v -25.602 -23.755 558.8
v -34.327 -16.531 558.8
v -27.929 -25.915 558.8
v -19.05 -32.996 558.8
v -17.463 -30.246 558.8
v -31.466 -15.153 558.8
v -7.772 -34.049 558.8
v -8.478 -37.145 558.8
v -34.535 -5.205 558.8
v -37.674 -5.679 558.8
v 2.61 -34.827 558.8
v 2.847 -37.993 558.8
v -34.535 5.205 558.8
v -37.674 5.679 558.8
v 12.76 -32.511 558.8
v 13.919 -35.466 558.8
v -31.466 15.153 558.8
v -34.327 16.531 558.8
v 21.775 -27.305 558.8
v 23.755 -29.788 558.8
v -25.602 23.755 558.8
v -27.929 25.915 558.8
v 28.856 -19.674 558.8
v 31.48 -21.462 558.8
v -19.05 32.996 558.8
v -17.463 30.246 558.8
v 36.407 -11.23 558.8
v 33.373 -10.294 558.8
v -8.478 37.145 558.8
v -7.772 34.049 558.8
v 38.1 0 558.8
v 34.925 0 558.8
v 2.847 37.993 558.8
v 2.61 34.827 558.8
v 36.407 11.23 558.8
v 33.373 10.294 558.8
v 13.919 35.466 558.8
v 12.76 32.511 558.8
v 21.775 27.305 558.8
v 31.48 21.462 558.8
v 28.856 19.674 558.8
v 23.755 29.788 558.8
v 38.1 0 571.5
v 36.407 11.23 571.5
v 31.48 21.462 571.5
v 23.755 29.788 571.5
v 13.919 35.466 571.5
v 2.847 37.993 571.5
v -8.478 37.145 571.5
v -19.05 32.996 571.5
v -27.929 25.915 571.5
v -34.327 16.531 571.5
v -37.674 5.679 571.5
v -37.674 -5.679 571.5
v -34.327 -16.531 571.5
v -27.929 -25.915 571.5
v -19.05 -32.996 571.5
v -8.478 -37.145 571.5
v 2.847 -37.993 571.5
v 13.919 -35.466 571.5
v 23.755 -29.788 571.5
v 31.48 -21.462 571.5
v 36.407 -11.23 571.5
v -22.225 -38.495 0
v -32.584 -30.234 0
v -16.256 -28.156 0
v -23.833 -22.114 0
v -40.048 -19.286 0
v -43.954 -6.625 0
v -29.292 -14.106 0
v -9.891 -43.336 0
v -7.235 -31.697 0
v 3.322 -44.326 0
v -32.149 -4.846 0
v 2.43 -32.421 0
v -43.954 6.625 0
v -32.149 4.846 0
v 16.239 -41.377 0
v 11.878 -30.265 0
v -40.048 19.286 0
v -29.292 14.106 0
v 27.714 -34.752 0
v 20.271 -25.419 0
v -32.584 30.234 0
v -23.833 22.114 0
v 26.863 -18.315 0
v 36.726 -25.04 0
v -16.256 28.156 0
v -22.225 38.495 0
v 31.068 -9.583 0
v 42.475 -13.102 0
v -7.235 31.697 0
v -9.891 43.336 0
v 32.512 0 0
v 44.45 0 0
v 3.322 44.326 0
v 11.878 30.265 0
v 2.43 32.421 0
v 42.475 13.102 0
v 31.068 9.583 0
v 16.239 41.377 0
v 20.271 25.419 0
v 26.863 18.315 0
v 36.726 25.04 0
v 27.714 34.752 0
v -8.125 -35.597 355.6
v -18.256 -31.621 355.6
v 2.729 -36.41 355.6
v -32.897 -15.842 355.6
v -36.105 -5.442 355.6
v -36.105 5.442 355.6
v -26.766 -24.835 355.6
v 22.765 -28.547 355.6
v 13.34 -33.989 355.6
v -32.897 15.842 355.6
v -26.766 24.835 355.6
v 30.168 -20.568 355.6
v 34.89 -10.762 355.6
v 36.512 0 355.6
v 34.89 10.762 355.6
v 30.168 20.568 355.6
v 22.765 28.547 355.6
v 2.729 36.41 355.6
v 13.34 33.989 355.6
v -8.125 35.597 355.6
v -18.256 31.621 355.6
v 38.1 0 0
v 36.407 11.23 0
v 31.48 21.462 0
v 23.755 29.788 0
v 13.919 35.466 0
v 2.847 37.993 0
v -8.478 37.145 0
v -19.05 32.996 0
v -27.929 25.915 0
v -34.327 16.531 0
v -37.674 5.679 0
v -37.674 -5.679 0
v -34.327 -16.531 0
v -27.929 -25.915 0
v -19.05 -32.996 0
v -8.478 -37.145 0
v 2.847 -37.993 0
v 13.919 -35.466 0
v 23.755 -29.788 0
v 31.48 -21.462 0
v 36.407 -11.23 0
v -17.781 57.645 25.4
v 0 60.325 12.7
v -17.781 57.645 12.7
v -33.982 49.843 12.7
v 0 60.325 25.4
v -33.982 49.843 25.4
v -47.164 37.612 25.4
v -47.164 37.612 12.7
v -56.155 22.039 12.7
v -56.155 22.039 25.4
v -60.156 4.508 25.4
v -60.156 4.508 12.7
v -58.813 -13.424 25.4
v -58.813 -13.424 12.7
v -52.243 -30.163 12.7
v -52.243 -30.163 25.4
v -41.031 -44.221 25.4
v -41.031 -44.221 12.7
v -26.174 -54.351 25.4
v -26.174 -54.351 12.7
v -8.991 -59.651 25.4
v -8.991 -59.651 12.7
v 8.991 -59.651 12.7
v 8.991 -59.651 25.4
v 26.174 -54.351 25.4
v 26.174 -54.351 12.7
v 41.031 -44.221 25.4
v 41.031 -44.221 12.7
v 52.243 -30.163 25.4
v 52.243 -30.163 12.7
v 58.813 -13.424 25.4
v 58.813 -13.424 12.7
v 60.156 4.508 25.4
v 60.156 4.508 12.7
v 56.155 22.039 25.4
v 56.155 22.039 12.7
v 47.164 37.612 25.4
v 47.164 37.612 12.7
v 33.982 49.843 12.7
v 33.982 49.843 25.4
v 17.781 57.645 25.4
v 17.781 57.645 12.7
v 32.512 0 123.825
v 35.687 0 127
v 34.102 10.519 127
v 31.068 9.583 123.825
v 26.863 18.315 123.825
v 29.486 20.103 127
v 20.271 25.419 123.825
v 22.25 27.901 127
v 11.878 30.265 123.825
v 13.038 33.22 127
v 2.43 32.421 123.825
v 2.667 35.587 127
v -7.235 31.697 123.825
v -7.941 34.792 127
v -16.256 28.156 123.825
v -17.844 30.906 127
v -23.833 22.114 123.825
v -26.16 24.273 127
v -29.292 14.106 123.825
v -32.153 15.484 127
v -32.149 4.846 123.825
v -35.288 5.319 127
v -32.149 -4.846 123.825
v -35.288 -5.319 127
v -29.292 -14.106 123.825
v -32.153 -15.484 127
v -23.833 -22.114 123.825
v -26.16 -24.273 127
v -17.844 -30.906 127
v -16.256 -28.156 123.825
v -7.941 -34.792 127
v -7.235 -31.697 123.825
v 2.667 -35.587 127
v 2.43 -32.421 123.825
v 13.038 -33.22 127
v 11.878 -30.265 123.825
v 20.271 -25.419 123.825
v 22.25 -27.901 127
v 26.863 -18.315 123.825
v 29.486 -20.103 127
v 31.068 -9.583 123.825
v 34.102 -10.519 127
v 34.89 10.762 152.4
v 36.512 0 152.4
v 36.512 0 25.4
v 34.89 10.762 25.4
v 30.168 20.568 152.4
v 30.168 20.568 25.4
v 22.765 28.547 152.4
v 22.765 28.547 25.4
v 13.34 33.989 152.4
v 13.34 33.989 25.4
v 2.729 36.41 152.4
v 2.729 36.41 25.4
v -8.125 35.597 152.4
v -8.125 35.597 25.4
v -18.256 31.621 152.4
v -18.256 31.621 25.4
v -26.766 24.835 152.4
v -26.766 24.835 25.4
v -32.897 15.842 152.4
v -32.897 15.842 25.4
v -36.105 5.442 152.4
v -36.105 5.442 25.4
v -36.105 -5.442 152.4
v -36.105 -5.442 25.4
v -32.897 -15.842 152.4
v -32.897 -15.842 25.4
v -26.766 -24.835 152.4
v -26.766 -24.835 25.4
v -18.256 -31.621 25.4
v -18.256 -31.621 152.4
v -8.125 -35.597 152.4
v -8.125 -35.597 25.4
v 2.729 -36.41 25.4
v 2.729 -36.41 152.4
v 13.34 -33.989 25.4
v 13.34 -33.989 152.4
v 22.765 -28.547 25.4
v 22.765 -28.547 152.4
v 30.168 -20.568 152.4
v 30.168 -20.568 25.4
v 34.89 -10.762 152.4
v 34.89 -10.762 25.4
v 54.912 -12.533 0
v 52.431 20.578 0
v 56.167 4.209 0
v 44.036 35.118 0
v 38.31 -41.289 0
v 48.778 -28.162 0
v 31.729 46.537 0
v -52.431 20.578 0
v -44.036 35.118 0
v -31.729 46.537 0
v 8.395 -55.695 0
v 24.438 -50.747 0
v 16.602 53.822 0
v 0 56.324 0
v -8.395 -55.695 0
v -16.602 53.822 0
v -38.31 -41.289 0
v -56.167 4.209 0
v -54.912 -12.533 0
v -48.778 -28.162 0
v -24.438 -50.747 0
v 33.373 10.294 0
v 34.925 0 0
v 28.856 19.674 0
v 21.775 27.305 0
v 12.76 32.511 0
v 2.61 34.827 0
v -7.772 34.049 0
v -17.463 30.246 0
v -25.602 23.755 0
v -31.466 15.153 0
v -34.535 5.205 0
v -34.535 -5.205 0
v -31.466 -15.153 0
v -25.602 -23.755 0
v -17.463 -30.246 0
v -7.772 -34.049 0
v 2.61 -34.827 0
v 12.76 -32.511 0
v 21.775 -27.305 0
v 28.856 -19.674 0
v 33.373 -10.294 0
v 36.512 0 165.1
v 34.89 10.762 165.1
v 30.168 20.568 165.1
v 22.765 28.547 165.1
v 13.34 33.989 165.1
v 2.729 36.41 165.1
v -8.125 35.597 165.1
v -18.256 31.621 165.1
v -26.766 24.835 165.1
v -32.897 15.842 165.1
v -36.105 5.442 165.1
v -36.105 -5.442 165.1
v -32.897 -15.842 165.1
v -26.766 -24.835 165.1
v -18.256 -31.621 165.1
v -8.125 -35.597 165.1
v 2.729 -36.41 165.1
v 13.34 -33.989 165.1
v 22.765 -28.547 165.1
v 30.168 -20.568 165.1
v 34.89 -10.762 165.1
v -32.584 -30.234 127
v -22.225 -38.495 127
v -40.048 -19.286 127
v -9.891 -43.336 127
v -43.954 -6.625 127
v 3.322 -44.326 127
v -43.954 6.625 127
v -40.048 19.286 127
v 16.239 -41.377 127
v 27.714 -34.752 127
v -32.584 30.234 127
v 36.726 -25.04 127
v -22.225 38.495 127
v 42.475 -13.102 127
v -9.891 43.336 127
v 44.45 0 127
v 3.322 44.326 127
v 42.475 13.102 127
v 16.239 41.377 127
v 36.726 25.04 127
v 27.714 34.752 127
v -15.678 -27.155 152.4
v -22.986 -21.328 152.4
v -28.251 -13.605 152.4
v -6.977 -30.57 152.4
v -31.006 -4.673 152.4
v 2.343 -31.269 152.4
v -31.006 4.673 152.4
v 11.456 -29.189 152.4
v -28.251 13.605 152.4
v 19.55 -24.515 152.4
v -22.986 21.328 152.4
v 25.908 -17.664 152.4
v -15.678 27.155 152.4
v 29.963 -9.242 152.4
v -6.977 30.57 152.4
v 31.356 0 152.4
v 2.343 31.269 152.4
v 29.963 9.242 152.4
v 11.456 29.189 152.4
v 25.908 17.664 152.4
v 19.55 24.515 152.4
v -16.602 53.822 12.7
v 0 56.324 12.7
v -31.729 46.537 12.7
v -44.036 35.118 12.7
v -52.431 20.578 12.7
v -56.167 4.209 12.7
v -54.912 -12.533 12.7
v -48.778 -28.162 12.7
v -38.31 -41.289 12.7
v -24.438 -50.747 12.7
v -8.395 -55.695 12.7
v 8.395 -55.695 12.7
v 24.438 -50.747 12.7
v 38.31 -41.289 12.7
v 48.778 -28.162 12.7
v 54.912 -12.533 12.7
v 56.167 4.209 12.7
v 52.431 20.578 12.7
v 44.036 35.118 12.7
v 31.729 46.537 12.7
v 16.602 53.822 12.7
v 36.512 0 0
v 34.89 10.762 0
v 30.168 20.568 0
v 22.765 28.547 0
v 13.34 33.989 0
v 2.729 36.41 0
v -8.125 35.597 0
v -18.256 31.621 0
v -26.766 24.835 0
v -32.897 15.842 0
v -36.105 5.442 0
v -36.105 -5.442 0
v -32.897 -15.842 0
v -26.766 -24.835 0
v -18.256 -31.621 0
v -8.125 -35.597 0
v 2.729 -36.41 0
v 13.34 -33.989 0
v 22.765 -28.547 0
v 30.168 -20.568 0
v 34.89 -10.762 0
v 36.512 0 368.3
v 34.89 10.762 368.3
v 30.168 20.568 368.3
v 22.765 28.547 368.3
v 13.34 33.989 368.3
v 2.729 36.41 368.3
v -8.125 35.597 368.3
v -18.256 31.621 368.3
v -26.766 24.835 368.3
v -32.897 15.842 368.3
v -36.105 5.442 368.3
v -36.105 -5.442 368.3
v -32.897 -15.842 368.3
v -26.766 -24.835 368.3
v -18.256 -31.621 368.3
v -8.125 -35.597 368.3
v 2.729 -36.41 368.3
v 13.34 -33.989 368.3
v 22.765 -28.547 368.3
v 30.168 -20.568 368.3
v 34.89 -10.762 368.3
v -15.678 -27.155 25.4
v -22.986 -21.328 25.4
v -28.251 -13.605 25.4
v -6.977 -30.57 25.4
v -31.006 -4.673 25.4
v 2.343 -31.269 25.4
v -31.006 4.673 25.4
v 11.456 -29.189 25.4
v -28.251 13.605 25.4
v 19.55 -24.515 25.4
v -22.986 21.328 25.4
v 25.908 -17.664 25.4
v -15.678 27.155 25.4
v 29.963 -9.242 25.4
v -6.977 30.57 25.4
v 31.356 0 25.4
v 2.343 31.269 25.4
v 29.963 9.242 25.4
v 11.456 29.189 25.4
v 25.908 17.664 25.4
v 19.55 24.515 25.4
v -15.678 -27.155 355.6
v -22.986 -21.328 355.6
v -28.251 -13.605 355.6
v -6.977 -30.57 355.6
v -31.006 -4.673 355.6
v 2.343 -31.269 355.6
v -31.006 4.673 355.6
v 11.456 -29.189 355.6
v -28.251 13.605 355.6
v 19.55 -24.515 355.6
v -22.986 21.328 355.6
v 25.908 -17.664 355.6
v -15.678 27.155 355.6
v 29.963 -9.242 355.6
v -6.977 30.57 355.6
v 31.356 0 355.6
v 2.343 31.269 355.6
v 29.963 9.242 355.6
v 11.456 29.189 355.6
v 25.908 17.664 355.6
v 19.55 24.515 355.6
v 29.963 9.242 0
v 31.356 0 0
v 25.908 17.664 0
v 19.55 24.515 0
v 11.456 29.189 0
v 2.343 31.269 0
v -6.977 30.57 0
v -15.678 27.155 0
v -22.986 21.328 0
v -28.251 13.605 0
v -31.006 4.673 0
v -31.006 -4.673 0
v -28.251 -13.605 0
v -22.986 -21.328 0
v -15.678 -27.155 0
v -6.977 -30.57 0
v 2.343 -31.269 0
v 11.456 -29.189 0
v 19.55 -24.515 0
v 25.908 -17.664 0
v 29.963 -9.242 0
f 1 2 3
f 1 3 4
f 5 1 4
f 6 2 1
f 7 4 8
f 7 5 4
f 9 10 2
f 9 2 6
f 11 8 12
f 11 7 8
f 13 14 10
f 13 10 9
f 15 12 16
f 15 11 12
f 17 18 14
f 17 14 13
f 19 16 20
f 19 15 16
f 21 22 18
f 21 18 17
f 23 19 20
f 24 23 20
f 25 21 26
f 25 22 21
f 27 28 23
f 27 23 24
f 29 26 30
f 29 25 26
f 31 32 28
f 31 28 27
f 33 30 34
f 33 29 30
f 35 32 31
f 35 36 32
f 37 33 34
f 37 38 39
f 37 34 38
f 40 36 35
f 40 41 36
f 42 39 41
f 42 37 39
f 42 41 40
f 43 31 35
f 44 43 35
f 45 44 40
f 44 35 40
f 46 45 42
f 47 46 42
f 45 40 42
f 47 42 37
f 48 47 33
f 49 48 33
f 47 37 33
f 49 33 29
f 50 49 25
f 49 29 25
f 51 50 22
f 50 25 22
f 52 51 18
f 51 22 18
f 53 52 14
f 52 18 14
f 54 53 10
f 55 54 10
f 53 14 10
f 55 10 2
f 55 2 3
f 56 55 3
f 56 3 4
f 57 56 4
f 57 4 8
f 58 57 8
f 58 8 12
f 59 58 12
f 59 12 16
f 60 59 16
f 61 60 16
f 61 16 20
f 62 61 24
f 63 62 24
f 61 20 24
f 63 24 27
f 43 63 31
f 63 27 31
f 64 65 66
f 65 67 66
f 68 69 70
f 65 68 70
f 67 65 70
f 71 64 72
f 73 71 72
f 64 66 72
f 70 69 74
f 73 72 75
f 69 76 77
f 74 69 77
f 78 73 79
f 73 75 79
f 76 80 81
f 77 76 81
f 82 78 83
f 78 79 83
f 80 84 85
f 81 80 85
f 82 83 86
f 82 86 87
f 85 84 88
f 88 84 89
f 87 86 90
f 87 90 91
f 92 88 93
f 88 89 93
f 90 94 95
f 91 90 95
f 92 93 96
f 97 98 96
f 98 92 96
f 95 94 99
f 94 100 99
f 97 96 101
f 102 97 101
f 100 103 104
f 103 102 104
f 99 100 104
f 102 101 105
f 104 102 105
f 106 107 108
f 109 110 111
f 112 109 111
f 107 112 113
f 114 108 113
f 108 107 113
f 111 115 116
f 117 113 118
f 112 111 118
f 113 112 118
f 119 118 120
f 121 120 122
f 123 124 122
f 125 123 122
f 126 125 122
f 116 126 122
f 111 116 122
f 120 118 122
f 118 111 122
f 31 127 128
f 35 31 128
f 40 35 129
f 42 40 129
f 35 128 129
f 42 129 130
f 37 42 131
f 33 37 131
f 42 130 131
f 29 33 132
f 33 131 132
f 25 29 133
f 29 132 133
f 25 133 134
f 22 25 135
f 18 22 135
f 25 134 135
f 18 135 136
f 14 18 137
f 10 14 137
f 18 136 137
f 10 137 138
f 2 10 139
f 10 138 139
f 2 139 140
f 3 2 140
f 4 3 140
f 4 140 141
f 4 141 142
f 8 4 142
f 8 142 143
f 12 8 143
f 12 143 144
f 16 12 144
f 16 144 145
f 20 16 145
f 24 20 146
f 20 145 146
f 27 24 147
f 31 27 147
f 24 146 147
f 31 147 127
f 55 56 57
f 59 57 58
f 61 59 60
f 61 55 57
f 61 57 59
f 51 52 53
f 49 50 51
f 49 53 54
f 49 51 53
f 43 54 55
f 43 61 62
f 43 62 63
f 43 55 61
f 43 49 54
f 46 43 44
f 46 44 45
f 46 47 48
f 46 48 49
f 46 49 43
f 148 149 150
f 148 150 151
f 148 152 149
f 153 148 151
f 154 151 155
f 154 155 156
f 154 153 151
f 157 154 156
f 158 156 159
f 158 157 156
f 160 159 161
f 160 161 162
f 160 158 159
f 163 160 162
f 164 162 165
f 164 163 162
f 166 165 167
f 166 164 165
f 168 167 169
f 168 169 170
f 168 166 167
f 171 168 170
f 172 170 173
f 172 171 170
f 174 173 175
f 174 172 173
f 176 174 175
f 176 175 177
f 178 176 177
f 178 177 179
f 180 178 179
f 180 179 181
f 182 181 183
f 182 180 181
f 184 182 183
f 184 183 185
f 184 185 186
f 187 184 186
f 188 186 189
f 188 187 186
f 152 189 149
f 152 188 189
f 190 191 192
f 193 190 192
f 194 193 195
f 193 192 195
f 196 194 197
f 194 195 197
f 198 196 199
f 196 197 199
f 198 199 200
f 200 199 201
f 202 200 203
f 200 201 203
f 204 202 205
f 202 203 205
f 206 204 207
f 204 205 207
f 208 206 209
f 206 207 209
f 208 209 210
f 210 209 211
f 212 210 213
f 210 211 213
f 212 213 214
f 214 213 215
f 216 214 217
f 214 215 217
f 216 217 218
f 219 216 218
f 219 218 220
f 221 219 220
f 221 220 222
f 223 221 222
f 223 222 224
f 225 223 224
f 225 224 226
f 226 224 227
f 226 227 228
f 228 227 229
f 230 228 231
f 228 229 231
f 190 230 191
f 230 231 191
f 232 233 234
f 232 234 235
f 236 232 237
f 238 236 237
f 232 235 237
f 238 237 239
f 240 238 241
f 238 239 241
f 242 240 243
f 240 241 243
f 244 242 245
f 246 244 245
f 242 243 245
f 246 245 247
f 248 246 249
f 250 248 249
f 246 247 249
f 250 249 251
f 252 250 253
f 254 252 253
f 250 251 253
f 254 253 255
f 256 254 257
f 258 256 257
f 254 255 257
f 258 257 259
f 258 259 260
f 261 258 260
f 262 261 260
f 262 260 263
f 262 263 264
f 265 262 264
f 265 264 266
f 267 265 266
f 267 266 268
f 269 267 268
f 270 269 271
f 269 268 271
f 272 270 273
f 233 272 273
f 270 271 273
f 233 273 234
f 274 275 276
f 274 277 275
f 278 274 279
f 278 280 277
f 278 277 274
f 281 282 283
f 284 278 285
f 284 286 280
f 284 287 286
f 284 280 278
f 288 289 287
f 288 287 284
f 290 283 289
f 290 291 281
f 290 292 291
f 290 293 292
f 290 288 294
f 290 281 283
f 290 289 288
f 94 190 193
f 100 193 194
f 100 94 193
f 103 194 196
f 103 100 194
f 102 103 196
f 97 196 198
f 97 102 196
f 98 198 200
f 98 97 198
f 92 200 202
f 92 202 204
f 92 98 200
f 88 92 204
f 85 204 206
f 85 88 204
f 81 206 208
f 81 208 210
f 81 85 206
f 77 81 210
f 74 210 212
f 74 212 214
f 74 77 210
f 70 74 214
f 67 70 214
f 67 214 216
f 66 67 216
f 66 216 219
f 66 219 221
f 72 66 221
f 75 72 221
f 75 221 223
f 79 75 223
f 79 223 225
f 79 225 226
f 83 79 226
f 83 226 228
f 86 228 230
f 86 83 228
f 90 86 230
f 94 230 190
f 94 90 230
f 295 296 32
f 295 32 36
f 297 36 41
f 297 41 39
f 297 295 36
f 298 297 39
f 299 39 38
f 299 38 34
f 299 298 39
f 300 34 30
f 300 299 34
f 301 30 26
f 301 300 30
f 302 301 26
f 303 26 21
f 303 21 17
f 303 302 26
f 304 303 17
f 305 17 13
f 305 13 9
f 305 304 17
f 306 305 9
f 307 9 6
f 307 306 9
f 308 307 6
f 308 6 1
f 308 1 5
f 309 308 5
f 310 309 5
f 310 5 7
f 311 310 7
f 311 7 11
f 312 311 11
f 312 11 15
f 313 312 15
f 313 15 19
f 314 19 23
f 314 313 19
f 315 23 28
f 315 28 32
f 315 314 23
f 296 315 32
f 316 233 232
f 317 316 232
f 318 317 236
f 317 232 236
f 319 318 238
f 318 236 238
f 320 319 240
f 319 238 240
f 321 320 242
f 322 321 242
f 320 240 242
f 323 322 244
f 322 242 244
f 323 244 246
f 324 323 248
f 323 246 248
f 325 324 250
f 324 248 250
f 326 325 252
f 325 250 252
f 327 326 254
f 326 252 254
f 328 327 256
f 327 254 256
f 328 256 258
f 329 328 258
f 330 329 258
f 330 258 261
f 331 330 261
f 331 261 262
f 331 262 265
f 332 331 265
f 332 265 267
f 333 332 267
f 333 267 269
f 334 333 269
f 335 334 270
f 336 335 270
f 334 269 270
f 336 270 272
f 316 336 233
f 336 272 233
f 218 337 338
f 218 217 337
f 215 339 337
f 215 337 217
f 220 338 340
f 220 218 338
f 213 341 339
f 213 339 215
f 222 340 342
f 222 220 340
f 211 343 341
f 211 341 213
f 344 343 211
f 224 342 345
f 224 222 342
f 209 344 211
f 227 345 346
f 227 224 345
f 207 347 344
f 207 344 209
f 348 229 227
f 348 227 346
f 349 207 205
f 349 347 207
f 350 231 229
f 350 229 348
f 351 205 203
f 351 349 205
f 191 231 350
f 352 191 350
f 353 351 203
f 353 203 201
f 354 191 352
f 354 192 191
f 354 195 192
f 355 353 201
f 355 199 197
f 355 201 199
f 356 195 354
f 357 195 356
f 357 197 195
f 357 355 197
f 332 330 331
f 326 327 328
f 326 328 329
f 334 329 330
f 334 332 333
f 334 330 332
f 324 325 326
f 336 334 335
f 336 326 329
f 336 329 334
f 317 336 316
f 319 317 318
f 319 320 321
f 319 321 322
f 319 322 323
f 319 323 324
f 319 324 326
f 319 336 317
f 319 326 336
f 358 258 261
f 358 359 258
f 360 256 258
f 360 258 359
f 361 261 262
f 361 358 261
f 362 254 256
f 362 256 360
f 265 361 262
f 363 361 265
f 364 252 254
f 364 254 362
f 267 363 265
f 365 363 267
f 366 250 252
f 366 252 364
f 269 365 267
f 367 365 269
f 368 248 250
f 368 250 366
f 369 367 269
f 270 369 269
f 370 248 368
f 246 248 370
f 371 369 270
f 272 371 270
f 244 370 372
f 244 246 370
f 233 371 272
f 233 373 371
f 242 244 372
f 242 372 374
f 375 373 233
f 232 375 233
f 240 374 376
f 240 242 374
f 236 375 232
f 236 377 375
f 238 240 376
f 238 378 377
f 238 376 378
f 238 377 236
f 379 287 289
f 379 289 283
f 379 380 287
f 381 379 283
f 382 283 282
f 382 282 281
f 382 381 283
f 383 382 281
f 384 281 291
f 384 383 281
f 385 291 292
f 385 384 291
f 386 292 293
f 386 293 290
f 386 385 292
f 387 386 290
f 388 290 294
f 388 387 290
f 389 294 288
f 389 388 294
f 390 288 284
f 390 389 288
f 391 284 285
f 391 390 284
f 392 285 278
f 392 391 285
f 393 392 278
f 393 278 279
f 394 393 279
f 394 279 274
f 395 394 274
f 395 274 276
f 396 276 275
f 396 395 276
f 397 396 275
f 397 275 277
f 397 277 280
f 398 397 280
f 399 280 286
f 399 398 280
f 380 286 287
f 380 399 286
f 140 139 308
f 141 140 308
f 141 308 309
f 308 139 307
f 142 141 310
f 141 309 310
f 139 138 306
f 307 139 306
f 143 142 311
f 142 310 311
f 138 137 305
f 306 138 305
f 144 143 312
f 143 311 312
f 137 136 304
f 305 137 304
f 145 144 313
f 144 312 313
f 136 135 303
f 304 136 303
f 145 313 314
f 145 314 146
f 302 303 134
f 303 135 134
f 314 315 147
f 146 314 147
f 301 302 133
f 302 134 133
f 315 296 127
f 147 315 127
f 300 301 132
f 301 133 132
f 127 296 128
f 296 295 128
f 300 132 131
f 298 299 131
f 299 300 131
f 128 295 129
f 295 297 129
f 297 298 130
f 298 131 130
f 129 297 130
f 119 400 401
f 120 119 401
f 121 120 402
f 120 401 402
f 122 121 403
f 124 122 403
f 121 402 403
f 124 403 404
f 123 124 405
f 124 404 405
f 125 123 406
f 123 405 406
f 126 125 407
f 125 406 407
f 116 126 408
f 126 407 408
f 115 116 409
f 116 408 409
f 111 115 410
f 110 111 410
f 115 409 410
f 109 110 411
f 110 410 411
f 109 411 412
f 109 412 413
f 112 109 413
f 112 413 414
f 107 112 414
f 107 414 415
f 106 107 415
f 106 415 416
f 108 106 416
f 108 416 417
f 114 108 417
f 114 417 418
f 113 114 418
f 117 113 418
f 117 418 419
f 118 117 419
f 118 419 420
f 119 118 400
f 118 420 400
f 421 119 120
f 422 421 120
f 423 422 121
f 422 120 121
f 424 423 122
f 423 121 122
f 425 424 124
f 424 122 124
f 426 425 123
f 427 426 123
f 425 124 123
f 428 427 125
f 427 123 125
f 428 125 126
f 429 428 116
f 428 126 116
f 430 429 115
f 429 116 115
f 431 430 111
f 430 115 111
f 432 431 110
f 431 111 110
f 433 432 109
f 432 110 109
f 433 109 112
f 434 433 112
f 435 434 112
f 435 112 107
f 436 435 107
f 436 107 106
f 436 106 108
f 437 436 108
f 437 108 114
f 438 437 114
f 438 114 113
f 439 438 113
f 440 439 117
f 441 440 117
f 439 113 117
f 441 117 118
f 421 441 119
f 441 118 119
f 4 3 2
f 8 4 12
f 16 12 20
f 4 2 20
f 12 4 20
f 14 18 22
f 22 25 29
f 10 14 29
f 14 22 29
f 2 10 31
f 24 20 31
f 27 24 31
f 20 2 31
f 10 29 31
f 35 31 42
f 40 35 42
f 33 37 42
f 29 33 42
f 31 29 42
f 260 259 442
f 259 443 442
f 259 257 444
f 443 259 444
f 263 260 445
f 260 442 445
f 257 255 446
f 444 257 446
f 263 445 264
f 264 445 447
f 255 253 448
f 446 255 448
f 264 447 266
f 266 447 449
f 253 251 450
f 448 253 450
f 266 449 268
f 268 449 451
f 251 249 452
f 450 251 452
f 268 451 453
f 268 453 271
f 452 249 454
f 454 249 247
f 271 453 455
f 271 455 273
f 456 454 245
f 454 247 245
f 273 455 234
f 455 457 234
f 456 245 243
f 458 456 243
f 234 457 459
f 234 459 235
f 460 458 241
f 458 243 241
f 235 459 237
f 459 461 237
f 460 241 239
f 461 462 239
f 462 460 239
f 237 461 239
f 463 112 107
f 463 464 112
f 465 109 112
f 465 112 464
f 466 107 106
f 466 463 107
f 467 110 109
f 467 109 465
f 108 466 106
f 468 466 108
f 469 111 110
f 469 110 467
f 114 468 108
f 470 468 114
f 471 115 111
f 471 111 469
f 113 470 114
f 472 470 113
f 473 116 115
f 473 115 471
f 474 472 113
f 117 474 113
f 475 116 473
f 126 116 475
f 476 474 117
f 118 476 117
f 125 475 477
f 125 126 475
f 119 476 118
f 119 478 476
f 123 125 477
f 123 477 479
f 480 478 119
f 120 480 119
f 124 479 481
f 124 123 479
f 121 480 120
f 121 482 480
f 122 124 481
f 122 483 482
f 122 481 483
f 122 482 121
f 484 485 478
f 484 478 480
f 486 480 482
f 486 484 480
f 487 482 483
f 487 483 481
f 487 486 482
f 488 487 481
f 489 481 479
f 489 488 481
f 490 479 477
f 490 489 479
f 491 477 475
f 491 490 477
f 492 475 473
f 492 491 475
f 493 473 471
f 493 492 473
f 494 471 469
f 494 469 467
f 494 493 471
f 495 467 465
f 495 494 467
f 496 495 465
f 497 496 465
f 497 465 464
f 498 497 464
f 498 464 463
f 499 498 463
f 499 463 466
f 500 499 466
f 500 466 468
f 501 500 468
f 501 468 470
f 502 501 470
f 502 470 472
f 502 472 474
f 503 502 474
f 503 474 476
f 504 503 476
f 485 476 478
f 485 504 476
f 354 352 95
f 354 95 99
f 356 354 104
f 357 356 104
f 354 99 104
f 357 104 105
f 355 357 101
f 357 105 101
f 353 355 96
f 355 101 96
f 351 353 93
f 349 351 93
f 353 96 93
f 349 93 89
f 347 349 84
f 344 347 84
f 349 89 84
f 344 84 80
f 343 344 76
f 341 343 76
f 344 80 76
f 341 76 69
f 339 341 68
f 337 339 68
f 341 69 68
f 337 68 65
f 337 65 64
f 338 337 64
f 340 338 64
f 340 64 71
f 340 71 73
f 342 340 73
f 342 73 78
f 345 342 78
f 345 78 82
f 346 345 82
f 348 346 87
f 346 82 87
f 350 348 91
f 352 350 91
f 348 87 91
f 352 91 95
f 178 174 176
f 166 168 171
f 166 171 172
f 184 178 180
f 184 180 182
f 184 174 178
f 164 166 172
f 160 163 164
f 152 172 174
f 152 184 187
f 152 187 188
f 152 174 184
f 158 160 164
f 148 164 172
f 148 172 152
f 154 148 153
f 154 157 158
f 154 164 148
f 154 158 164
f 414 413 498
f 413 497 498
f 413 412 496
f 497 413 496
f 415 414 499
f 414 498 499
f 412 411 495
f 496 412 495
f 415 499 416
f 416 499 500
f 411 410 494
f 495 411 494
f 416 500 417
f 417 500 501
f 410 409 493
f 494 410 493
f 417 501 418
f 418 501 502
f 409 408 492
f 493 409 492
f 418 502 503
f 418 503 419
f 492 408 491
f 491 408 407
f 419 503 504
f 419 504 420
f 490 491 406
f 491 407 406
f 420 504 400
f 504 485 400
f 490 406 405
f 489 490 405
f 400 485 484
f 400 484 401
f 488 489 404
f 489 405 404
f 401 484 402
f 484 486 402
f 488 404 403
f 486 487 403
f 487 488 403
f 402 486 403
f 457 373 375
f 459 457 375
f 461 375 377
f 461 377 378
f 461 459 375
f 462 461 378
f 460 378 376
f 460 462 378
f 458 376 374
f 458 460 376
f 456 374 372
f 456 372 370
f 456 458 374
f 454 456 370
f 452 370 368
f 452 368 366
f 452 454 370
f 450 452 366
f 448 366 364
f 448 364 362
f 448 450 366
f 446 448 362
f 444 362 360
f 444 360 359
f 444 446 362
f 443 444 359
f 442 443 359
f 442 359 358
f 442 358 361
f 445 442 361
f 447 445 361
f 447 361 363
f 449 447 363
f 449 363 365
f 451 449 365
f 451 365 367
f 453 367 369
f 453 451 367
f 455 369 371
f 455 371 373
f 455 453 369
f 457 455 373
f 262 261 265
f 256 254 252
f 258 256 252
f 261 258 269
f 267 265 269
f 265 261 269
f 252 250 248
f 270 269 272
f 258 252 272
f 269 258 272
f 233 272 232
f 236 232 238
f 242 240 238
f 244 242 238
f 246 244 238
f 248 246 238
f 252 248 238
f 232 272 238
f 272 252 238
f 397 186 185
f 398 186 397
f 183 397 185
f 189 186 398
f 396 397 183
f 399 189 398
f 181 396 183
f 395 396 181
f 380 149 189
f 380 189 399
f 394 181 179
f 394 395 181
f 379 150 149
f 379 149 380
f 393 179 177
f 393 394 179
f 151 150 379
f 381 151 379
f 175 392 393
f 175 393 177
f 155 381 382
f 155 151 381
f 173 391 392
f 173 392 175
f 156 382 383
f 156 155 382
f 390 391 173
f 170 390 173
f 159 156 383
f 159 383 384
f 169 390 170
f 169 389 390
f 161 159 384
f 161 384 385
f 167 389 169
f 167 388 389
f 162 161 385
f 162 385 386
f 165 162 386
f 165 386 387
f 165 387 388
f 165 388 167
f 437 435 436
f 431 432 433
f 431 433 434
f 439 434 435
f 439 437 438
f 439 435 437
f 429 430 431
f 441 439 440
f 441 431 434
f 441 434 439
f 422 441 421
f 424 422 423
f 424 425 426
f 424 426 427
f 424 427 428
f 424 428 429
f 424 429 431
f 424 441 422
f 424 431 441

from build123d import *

# Parameters (mm, degrees)
F0_R      = 44.45
F0_R_2    = 32.512
F1_DEPTH  = 127
F2_SIZE   = 3.175
F3_R      = 36.5125
F3_R_2    = 31.3563
F4_DEPTH  = 355.6
F5_R      = 36.5125
F6_DEPTH  = 12.7
F7_R      = 38.1
F7_R_2    = 34.925
F8_DEPTH  = 558.8
F9_R      = 38.1
F10_DEPTH = 12.7
F13_R     = 36.5125
F13_R_2   = 31.3563
F14_DEPTH = 127
F15_R     = 36.5125
F16_DEPTH = 12.7


with BuildPart() as f1:
    # F0 (on Top) → F1 (new body)
    with BuildSketch(Plane.XY):
        Circle(F0_R)
        Circle(F0_R_2, mode=Mode.SUBTRACT)
    extrude(amount=F1_DEPTH)

    # F2
    f2_edges = [f1.edges().sort_by_distance(p)[0] for p in [
        (-32.512, 0, 127),
    ]]
    chamfer(f2_edges, length=F2_SIZE)


with BuildPart() as f4:
    # F3 (on Top) → F4 (new body)
    with BuildSketch(Plane.XY):
        Circle(F3_R)
        Circle(F3_R_2, mode=Mode.SUBTRACT)
    extrude(amount=F4_DEPTH)


with BuildPart() as f6:
    # F5 (on face) → F6 (new body)
    with BuildSketch(Plane.XY.offset(355.6)):
        Circle(F5_R)
    extrude(amount=F6_DEPTH)


with BuildPart() as f8:
    # F7 (on Top) → F8 (new body)
    with BuildSketch(Plane.XY):
        Circle(F7_R)
        Circle(F7_R_2, mode=Mode.SUBTRACT)
    extrude(amount=F8_DEPTH)


with BuildPart() as f10:
    # F9 (on face) → F10 (new body)
    with BuildSketch(Plane.XY.offset(558.8)):
        Circle(F9_R)
    extrude(amount=F10_DEPTH)


with BuildPart() as f12:
    # F11 (on Right) → F12 (revolve)
    with BuildSketch(Plane.YZ):
        Polygon((60.325, 25.4), (0, 25.4), (0, 0), (56.3245, 0), (56.3245, 12.7), (60.325, 12.7), align=None)
    revolve(axis=Axis((0, 0, 12.7), (0, 0, 1)))


with BuildPart() as f14:
    # F13 (on face) → F14 (new body)
    with BuildSketch(Plane.XY.offset(25.4)):
        Circle(F13_R)
        Circle(F13_R_2, mode=Mode.SUBTRACT)
    extrude(amount=F14_DEPTH)


with BuildPart() as f16:
    # F15 (on face) → F16 (new body)
    with BuildSketch(Plane.XY.offset(152.4)):
        Circle(F15_R)
    extrude(amount=F16_DEPTH)


solid = Compound([f1.part, f4.part, f6.part, f8.part, f10.part, f12.part, f14.part, f16.part])
